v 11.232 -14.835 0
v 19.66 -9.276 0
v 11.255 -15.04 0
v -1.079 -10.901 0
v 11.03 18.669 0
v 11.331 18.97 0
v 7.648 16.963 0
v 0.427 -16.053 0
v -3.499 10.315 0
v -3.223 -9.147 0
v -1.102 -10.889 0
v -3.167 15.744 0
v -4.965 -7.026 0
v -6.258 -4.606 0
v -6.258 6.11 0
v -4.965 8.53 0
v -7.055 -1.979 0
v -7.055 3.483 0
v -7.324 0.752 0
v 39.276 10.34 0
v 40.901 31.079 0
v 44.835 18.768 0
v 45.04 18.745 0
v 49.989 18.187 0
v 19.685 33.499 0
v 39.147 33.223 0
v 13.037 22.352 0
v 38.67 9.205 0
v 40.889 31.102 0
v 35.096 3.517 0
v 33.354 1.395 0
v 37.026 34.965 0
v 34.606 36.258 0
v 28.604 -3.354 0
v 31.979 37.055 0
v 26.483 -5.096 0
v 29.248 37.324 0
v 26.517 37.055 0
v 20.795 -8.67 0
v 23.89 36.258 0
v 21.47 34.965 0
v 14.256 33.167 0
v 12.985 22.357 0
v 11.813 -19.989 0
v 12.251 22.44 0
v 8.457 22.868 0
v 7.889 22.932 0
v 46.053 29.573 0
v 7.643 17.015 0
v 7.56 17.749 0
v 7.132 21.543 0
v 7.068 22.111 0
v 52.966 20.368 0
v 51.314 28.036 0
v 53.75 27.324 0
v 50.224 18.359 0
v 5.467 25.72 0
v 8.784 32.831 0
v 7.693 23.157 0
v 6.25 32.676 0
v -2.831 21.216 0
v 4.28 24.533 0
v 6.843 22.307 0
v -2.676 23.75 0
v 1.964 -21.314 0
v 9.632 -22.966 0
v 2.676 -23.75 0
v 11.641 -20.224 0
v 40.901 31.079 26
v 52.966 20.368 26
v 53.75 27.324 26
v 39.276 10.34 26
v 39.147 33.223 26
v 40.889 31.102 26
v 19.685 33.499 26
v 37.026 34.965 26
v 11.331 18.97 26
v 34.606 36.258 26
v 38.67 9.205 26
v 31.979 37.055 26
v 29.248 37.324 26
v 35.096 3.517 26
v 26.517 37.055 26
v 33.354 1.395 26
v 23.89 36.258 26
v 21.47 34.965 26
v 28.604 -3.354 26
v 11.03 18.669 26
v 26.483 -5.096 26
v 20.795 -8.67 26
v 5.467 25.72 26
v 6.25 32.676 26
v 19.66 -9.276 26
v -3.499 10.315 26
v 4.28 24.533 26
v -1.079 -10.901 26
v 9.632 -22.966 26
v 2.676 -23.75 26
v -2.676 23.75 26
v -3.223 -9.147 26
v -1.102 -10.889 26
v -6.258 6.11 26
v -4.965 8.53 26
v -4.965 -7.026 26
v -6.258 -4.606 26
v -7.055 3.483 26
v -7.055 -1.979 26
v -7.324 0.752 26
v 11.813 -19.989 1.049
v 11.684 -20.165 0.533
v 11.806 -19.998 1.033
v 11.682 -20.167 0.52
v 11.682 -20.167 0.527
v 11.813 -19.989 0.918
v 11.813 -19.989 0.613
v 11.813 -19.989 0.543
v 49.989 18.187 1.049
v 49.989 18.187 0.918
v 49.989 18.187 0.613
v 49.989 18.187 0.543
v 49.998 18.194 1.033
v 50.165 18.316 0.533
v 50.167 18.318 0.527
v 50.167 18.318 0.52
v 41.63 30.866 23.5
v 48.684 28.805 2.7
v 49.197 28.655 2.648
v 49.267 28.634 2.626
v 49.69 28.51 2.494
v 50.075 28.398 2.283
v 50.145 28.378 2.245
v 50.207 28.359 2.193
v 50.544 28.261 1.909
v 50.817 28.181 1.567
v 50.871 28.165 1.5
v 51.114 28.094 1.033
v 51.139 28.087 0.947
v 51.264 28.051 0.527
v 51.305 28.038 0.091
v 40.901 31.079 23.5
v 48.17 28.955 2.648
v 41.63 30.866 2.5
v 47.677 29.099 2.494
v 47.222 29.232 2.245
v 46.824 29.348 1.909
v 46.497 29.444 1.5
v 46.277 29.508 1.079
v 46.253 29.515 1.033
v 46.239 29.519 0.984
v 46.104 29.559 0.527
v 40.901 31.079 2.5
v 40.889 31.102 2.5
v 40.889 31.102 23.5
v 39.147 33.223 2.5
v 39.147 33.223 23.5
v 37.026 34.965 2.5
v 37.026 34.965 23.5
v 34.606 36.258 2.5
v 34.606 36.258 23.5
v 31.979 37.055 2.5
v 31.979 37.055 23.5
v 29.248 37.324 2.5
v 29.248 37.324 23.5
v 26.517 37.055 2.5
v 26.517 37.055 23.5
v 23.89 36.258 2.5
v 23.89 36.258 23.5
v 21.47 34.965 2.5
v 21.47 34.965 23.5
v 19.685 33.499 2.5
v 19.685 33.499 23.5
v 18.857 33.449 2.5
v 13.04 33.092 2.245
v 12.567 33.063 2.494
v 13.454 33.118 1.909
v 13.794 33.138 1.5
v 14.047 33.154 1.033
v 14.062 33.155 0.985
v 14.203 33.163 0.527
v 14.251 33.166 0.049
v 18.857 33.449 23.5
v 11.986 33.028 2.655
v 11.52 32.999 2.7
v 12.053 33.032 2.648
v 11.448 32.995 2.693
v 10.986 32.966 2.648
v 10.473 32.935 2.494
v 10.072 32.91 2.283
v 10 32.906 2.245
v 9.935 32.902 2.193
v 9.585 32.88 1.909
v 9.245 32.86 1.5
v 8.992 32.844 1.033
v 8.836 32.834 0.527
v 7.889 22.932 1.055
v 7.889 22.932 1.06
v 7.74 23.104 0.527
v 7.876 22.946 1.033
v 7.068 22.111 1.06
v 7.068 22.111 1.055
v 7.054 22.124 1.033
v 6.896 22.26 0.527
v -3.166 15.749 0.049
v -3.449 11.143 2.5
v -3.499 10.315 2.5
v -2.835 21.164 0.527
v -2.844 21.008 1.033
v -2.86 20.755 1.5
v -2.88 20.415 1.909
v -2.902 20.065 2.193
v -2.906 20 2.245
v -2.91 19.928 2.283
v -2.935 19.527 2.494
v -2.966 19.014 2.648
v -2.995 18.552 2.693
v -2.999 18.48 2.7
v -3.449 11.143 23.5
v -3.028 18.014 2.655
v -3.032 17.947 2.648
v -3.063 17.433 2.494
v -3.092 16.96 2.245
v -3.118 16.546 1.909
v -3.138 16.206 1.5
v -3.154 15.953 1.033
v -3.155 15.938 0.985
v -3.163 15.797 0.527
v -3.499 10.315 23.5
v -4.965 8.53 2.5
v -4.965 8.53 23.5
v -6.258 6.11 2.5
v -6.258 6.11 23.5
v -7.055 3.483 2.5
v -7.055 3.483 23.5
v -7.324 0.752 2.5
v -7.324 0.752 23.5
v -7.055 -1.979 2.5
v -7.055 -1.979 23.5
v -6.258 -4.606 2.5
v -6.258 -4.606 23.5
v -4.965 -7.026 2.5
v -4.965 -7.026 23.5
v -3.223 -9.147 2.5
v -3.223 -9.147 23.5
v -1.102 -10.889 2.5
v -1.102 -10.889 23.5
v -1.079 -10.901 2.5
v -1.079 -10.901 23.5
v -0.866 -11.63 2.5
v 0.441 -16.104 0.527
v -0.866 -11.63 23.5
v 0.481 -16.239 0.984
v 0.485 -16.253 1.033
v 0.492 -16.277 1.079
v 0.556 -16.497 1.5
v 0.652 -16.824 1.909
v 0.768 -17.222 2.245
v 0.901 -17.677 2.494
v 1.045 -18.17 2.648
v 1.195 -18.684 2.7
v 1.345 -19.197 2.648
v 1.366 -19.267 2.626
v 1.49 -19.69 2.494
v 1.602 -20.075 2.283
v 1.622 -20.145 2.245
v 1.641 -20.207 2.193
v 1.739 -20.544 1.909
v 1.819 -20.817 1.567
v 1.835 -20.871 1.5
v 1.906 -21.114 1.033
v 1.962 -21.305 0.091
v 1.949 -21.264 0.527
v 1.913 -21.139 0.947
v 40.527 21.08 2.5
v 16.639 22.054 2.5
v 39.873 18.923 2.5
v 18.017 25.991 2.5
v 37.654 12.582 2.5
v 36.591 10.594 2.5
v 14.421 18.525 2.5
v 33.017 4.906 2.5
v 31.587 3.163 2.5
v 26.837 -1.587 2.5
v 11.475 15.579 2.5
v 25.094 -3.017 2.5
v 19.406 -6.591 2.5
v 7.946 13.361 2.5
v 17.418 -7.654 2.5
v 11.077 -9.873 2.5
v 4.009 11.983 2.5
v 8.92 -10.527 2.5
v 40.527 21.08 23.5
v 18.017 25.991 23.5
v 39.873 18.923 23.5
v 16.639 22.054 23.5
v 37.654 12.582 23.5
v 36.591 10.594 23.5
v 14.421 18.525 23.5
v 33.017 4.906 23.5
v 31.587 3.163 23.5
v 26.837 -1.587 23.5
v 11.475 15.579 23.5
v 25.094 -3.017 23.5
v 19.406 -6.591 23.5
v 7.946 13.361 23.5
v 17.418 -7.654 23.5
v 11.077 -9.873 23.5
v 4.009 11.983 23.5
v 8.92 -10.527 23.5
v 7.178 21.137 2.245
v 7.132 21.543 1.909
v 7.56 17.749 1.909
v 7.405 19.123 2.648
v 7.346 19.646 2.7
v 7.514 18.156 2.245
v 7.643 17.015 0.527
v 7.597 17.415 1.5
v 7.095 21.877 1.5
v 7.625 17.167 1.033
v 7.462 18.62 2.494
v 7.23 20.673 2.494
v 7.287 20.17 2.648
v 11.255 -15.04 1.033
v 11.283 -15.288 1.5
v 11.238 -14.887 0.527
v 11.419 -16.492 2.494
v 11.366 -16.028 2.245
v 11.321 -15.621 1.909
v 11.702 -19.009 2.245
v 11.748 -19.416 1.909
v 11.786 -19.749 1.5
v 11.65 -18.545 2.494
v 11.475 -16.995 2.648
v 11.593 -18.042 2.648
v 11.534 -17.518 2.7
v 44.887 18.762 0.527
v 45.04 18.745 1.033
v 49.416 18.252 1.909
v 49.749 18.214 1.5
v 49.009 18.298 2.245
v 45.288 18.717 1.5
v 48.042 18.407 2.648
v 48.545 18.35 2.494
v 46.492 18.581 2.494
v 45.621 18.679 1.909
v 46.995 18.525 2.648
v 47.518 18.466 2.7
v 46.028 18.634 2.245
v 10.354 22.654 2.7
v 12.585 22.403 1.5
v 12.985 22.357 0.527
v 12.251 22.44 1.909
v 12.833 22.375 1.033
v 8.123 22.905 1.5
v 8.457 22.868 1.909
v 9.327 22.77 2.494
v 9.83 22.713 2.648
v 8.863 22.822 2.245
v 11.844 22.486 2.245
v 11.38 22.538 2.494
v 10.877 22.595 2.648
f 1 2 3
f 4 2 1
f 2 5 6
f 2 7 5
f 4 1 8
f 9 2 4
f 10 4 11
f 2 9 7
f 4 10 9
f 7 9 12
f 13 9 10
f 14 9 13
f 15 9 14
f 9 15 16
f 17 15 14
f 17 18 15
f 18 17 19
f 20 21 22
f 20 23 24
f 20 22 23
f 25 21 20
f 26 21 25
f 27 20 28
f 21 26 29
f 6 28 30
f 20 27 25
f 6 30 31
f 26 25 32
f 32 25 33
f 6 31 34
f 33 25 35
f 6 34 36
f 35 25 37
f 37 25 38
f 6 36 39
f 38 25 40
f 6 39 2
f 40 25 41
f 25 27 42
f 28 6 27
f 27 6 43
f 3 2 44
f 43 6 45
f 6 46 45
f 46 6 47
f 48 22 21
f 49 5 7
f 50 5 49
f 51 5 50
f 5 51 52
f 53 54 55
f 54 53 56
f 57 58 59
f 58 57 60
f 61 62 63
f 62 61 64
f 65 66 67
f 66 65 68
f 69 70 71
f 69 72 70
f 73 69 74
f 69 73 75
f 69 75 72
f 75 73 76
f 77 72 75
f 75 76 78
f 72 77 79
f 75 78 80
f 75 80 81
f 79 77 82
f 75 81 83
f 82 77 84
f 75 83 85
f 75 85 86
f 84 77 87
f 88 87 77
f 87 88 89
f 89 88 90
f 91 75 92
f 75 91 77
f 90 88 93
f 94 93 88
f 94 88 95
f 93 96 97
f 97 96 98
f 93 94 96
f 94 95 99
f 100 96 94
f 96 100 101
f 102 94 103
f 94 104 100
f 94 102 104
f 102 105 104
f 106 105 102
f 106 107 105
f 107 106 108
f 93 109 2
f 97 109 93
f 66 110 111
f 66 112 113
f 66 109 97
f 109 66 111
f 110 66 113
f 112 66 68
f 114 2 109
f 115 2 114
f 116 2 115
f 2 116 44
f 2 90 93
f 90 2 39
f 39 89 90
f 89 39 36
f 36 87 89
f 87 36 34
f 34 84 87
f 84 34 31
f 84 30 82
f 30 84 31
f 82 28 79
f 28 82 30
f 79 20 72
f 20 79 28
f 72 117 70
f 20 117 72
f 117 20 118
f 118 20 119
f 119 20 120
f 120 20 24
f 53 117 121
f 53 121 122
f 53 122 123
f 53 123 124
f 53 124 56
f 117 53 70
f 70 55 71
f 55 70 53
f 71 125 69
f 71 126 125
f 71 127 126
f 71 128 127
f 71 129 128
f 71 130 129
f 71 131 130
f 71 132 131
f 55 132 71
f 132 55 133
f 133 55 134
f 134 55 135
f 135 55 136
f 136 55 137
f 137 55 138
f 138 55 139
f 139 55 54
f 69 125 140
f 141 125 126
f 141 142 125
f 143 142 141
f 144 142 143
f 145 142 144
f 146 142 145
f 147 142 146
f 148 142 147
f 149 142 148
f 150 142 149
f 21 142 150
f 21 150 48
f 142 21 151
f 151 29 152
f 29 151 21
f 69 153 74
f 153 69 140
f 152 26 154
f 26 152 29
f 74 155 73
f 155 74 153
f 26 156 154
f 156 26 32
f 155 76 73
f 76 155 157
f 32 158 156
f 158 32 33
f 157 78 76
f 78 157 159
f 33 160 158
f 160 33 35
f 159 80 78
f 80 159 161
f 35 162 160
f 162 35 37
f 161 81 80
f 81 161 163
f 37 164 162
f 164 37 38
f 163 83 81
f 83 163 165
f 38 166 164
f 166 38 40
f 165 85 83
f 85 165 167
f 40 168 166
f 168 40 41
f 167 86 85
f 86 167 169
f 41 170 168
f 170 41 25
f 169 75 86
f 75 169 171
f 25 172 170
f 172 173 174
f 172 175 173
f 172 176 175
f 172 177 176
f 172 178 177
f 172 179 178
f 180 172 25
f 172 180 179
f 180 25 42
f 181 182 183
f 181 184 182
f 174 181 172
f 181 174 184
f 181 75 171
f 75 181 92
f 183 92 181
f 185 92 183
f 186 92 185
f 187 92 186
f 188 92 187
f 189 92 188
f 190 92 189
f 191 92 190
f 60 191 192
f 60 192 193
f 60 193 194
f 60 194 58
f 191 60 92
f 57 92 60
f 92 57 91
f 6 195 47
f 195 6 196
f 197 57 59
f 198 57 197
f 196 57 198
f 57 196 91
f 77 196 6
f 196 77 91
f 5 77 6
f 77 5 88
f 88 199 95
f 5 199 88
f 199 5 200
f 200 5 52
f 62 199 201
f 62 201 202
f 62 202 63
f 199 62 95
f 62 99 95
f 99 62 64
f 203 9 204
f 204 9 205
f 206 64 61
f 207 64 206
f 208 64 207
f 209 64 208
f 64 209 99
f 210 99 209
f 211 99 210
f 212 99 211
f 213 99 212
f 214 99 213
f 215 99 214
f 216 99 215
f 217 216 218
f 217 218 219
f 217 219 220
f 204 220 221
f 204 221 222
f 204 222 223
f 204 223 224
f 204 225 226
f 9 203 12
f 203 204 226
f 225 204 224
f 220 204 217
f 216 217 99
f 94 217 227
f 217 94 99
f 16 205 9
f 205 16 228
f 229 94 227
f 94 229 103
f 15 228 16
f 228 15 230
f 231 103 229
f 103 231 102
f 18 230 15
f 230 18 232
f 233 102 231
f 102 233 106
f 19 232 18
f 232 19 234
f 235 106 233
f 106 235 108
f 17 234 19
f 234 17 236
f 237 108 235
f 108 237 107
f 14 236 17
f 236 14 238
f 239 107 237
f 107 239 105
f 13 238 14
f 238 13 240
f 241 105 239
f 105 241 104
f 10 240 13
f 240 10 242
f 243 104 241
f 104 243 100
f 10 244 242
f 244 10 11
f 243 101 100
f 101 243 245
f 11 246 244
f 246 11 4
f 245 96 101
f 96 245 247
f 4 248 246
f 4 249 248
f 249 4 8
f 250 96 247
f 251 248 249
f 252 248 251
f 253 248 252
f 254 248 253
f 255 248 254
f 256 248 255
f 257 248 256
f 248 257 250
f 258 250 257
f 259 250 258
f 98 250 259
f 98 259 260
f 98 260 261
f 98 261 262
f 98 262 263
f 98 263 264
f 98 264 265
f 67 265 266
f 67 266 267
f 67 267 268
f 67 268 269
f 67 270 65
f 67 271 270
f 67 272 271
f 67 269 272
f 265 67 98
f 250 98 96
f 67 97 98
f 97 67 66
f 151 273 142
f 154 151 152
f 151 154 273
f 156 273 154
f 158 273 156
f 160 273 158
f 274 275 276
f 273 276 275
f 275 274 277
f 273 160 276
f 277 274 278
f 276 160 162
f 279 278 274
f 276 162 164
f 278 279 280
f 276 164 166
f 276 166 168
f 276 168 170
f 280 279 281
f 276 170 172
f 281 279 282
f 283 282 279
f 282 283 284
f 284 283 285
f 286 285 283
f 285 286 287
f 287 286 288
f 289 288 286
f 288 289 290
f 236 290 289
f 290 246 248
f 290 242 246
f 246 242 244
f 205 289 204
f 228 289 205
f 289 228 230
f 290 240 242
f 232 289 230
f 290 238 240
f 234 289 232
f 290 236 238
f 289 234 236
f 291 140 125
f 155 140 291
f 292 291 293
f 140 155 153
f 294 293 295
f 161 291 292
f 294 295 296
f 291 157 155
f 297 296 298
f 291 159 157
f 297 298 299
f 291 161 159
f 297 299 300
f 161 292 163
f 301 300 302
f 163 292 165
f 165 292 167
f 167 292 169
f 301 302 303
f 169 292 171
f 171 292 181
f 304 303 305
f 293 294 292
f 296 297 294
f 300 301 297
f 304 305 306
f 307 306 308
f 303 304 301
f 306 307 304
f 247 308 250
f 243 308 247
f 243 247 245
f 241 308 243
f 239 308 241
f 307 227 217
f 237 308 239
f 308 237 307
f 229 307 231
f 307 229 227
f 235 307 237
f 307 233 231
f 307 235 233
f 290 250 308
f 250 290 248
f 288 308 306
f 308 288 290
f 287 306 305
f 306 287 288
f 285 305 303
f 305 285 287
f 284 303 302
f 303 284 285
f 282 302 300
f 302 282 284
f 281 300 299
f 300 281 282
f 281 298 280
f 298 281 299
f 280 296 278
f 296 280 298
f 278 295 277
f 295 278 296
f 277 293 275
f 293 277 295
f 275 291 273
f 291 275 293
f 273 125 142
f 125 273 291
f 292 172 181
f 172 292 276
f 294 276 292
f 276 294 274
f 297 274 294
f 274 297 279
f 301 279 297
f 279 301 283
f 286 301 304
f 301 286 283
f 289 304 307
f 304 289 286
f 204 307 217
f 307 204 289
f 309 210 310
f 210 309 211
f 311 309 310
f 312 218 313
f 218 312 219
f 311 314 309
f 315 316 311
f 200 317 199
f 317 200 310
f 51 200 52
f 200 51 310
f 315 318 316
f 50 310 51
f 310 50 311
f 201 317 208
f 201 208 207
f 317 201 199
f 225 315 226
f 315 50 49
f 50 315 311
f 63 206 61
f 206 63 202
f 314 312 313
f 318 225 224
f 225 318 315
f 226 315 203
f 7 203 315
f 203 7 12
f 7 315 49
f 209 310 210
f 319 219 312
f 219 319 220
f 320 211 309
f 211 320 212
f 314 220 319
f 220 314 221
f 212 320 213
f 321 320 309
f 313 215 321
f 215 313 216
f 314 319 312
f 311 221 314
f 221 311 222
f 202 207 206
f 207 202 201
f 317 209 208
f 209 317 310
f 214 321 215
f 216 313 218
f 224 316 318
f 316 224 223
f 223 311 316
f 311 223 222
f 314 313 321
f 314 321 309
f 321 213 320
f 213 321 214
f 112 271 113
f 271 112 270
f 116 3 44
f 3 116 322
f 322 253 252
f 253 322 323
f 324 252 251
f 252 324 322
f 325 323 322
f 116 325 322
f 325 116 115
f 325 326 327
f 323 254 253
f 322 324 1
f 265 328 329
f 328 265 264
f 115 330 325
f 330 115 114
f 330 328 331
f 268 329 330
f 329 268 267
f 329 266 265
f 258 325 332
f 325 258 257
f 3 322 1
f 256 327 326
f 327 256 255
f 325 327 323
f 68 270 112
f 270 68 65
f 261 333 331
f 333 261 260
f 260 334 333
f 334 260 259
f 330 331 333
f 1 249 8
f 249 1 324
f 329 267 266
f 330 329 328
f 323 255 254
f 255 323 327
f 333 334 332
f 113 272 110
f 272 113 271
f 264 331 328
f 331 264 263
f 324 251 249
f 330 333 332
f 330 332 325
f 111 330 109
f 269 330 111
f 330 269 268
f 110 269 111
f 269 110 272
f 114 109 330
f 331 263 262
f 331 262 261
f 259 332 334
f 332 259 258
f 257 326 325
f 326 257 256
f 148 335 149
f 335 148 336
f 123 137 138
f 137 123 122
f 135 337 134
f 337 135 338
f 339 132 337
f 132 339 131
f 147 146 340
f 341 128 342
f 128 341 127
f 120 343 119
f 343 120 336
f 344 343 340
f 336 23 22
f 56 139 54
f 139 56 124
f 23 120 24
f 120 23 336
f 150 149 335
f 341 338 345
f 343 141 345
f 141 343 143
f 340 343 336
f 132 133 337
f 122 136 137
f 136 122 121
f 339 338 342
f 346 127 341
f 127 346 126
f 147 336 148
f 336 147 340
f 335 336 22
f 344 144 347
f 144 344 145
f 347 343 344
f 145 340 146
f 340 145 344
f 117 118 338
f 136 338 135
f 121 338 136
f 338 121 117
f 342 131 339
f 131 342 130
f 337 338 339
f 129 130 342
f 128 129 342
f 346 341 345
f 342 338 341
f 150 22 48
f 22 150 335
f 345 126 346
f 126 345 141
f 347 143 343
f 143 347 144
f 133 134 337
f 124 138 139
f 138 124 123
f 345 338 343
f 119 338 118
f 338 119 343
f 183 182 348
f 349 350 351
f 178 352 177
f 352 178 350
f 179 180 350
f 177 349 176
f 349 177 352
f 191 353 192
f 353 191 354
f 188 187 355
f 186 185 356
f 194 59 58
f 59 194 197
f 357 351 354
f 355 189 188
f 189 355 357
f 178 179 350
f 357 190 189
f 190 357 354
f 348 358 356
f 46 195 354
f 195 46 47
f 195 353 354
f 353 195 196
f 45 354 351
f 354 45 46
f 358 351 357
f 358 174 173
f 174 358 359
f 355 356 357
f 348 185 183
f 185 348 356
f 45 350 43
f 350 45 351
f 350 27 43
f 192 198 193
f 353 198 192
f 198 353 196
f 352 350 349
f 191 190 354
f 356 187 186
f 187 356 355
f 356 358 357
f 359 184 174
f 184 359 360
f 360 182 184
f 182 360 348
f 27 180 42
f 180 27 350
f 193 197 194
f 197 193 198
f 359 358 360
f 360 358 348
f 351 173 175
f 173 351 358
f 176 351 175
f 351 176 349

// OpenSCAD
$fn = 32;

// ----------------------------------------------------------------------
// Air duct: 28 mm duct, 2.5 mm wall, 26 mm across
// ----------------------------------------------------------------------

// --- parameters (mm) ---
duct_r = 14;              // duct core radius
duct_d = 28;              // duct core diameter
wall = 2.5;               // duct wall thickness
height = 26;              // duct width (extrusion height)
port_r = 23.9;            // port flange half width
port_d = 47.8;            // port flange width
port_t = 7;               // port flange thickness
bolt_d = 5.4;             // port bolt holes
bolt_offset = 18.7;       // bolt hole offset from the port axis

difference() {
  /* outer hull chain: tube with a flat flange plate at every port */
  linear_extrude(height = 26) {
    hull() {
      polygon([[2.676, -23.75], [-2.676, 23.75], [4.28, 24.533], [9.632, -22.966]]);
      translate([9.937, 1.12]) circle(r = 14);
    }
    hull() {
      translate([9.937, 1.12]) circle(r = 14);
      translate([6.676, 0.752]) circle(r = 14);
    }
    hull() {
      translate([6.676, 0.752]) circle(r = 14);
      translate([13.017, 2.971]) circle(r = 14);
    }
    hull() {
      translate([13.017, 2.971]) circle(r = 14);
      translate([18.705, 6.545]) circle(r = 14);
    }
    hull() {
      translate([18.705, 6.545]) circle(r = 14);
      translate([23.455, 11.295]) circle(r = 14);
    }
    hull() {
      translate([23.455, 11.295]) circle(r = 14);
      translate([27.029, 16.983]) circle(r = 14);
    }
    hull() {
      translate([27.029, 16.983]) circle(r = 14);
      translate([29.248, 23.324]) circle(r = 14);
    }
    hull() {
      translate([29.248, 23.324]) circle(r = 14);
      translate([28.88, 20.063]) circle(r = 14);
    }
    hull() {
      translate([28.88, 20.063]) circle(r = 14);
      polygon([[6.25, 32.676], [53.75, 27.324], [52.966, 20.368], [5.467, 25.72]]);
    }
  }
  /* air passage: the same chain inset by the wall, 5 mm proud of the ports */
  translate([0, 0, 2.5]) linear_extrude(height = 21) {
    hull() {
      translate([-4.969, -0.56]) circle(r = 11.5);
      translate([6.676, 0.752]) circle(r = 11.5);
    }
    hull() {
      translate([6.676, 0.752]) circle(r = 11.5);
      translate([13.017, 2.971]) circle(r = 11.5);
    }
    hull() {
      translate([13.017, 2.971]) circle(r = 11.5);
      translate([18.705, 6.545]) circle(r = 11.5);
    }
    hull() {
      translate([18.705, 6.545]) circle(r = 11.5);
      translate([23.455, 11.295]) circle(r = 11.5);
    }
    hull() {
      translate([23.455, 11.295]) circle(r = 11.5);
      translate([27.029, 16.983]) circle(r = 11.5);
    }
    hull() {
      translate([27.029, 16.983]) circle(r = 11.5);
      translate([29.248, 23.324]) circle(r = 11.5);
    }
    hull() {
      translate([29.248, 23.324]) circle(r = 11.5);
      translate([30.56, 34.969]) circle(r = 11.5);
    }
  }
  translate([0, 0]) rotate([0, 0, -83.57]) translate([-18.7, -2.5]) rotate([-90, 0, 0]) cylinder(h = 12, d = 5.4);
  translate([0, 0]) rotate([0, 0, -83.57]) translate([18.7, -2.5]) rotate([-90, 0, 0]) cylinder(h = 12, d = 5.4);
  translate([30, 30]) rotate([0, 0, 173.57]) translate([-18.7, -2.5]) rotate([-90, 0, 0]) cylinder(h = 12, d = 5.4);
  translate([30, 30]) rotate([0, 0, 173.57]) translate([18.7, -2.5]) rotate([-90, 0, 0]) cylinder(h = 12, d = 5.4);
}
